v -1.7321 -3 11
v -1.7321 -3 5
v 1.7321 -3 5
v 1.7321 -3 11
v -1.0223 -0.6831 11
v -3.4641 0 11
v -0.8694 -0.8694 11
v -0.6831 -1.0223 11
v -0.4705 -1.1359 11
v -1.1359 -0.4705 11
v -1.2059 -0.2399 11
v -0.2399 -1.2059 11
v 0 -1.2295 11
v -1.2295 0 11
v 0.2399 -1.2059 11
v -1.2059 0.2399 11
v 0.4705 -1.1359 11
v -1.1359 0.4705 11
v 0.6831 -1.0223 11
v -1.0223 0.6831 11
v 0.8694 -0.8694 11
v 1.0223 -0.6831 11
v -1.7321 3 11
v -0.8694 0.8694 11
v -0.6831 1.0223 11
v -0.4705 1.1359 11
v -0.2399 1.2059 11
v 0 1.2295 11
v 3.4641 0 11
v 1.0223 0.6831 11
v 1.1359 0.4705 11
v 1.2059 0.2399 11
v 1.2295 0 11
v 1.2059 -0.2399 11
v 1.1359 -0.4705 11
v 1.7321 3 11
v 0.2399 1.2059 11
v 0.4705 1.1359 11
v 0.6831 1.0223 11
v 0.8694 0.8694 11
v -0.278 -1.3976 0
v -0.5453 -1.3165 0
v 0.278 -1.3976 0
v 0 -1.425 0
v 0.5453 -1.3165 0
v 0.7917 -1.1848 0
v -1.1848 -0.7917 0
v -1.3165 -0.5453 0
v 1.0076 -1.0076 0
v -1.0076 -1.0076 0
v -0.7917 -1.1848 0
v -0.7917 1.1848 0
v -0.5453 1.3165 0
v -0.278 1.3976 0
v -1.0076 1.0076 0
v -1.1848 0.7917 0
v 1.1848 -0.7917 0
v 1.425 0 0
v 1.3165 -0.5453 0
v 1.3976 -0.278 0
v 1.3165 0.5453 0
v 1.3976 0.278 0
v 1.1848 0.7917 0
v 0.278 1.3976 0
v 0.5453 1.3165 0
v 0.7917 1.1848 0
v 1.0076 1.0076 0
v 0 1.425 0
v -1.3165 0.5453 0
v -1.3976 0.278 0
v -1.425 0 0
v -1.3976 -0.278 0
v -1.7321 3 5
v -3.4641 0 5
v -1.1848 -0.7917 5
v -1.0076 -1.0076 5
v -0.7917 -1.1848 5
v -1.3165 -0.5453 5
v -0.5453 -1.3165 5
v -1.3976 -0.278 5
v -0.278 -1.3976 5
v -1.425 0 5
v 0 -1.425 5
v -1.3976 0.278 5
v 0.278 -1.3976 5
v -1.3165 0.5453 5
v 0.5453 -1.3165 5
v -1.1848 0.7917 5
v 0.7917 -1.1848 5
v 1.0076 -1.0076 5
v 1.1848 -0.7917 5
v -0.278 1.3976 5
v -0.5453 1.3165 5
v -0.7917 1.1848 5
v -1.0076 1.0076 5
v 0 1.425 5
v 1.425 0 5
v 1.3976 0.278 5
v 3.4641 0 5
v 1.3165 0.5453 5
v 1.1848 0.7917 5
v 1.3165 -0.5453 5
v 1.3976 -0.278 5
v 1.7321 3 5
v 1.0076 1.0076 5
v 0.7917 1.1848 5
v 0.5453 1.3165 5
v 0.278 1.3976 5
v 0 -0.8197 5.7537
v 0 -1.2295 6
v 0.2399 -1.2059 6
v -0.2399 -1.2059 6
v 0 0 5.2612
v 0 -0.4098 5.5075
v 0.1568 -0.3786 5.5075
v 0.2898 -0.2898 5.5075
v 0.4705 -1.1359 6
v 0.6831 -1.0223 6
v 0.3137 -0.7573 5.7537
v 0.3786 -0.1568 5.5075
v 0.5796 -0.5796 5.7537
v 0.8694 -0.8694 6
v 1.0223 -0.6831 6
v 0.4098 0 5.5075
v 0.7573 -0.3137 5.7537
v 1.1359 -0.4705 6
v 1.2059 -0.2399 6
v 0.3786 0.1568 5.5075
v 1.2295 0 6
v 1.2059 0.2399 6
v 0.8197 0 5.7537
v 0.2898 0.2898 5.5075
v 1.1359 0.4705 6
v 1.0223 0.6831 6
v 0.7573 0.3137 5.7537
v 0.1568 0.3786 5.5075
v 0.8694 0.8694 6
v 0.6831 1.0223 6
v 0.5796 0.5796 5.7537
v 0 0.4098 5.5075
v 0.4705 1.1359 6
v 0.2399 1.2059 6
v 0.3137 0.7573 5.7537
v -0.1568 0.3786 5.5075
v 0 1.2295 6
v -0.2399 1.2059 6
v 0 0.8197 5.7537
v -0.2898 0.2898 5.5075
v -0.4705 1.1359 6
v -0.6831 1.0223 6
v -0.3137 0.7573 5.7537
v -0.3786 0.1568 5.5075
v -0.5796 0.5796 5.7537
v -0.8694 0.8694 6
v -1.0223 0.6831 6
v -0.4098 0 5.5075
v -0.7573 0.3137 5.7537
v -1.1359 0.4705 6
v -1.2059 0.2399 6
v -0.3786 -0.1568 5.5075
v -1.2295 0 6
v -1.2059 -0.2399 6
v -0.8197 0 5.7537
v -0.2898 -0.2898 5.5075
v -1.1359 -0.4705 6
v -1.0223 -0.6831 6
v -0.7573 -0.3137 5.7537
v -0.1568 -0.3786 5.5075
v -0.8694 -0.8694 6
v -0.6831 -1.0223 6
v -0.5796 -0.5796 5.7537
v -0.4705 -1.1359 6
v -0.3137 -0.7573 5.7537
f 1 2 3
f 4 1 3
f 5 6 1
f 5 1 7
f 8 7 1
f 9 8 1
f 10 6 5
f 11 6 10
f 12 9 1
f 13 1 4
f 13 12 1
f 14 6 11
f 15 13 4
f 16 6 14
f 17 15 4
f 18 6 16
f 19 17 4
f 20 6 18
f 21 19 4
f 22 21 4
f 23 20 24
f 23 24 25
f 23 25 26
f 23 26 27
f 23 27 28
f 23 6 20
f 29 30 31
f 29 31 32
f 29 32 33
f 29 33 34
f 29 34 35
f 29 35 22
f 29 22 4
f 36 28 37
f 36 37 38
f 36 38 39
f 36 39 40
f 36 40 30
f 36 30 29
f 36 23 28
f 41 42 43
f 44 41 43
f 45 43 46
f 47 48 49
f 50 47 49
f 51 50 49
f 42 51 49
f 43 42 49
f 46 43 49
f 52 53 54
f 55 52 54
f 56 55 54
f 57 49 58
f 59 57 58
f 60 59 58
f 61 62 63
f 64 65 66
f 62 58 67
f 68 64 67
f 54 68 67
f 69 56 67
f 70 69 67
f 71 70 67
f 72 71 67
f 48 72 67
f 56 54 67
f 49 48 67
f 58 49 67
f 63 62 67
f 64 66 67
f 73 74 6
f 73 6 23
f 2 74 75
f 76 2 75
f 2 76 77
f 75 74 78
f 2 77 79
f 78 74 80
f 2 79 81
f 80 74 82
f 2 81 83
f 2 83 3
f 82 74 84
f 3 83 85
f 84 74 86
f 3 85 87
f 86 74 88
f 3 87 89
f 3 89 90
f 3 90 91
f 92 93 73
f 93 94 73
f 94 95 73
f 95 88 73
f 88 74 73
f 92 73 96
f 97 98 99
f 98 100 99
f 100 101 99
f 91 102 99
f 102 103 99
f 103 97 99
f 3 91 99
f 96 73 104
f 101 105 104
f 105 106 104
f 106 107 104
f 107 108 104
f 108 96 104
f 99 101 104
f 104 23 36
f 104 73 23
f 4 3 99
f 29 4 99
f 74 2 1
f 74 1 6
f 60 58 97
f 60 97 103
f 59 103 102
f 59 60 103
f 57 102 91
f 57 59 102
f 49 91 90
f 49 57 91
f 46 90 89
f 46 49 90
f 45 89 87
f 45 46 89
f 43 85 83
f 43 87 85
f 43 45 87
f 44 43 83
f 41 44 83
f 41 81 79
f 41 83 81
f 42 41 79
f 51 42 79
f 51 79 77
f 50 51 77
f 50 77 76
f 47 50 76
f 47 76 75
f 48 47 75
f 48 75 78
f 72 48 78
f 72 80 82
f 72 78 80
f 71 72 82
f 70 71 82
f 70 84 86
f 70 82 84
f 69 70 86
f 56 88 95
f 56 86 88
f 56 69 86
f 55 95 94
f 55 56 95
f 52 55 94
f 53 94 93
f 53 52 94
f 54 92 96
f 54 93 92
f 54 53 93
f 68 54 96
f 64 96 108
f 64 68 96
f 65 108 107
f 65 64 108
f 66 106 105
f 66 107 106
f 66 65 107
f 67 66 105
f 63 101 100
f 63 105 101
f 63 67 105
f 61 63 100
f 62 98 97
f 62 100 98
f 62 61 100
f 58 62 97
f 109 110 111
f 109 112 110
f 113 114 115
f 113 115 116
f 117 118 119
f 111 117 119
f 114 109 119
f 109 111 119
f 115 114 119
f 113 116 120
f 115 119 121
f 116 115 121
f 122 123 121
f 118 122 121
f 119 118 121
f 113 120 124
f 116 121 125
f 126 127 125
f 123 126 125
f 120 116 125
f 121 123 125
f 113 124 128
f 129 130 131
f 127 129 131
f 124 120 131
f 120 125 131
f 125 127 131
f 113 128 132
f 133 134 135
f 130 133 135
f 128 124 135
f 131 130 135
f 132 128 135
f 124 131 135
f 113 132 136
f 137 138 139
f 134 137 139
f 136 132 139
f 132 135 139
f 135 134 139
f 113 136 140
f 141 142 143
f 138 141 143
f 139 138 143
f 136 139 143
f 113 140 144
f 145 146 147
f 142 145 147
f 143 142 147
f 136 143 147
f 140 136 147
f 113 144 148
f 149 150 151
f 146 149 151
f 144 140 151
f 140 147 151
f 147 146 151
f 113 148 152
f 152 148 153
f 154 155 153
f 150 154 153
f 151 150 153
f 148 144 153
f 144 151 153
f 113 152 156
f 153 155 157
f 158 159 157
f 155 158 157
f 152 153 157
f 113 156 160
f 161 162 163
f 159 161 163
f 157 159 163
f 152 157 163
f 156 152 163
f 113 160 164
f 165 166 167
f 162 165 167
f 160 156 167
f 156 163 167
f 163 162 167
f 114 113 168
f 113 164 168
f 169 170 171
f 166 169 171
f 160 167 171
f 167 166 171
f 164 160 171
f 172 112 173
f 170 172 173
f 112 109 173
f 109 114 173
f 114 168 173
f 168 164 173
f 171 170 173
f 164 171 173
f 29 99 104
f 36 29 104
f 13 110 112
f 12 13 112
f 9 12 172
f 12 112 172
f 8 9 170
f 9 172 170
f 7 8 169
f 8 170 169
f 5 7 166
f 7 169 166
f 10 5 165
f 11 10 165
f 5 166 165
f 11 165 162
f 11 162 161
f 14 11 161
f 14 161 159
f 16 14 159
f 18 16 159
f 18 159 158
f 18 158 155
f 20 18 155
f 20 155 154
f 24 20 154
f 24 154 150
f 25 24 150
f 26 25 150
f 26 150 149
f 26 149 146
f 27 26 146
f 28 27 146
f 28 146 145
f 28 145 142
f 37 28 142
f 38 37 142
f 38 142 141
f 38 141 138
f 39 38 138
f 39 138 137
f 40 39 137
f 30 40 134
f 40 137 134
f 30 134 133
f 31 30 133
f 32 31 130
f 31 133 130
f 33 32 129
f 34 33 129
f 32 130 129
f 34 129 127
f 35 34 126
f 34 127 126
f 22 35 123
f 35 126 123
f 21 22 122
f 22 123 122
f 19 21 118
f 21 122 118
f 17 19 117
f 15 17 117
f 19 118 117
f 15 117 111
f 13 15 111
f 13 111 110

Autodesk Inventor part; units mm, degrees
ref_plane "Plan YZ" through (0, 0, 0) normal (1, 0, 0) x (0, 1, 0)
ref_plane "Plan XZ" through (0, 0, 0) normal (0, 1, 0) x (-1, 0, 0)
ref_plane "Plan XY" through (0, 0, 0) normal (0, 0, 1) x (1, 0, 0)
sketch "Esquisse1" plane through (0, 0, 0) normal (0, 0, 1) x (1, 0, 0)
  circle A0 centre (0, 0) radius 1.425
  dimension "d0" = 2.85
extrude "Extrusion1" add sketch "Esquisse1" along normal blind 5
sketch "Esquisse6" plane through (0, 0, 5) normal (0, 0, 1) x (1, 0, 0)
  line L0 (-4.8497, 0) -> (4.8497, 0) construction
  line L1 (0, -4.2) -> (0, 4.2) construction
  line L2 (-1.7321, -3) -> (-3.4641, 0)
  line L3 (-3.4641, 0) -> (-1.7321, 3)
  line L4 (-1.7321, 3) -> (0, 3)
  line L5 (-1.7321, -3) -> (0, -3)
  line L6 (1.7321, -3) -> (3.4641, 0)
  line L7 (3.4641, 0) -> (1.7321, 3)
  line L8 (1.7321, 3) -> (0, 3)
  line L9 (1.7321, -3) -> (0, -3)
  point P0 (0, 0)
  dimension "d4" = 6
  dimension "d8" = 120
  dimension "d10" = 6
extrude "Extrusion2" add sketch "Esquisse6" along normal blind 6
sketch "Esquisse7" plane through (0, 0, 11) normal (0, 0, 1) x (1, 0, 0)
  circle A0 centre (0, 0) radius 1.425 projected
hole "Perçage1" at (0, 0, 11) direction (0, 0, -1) diameter 2.459 depth 5 tip angle 118 thread size "M3x0.5" class "6H" standard "ISO M"
thread "Filetage1" size "M3x0.5" class "6g" standard "ISO M" full length
properties part number "Entretoise_M3x6" material "."
